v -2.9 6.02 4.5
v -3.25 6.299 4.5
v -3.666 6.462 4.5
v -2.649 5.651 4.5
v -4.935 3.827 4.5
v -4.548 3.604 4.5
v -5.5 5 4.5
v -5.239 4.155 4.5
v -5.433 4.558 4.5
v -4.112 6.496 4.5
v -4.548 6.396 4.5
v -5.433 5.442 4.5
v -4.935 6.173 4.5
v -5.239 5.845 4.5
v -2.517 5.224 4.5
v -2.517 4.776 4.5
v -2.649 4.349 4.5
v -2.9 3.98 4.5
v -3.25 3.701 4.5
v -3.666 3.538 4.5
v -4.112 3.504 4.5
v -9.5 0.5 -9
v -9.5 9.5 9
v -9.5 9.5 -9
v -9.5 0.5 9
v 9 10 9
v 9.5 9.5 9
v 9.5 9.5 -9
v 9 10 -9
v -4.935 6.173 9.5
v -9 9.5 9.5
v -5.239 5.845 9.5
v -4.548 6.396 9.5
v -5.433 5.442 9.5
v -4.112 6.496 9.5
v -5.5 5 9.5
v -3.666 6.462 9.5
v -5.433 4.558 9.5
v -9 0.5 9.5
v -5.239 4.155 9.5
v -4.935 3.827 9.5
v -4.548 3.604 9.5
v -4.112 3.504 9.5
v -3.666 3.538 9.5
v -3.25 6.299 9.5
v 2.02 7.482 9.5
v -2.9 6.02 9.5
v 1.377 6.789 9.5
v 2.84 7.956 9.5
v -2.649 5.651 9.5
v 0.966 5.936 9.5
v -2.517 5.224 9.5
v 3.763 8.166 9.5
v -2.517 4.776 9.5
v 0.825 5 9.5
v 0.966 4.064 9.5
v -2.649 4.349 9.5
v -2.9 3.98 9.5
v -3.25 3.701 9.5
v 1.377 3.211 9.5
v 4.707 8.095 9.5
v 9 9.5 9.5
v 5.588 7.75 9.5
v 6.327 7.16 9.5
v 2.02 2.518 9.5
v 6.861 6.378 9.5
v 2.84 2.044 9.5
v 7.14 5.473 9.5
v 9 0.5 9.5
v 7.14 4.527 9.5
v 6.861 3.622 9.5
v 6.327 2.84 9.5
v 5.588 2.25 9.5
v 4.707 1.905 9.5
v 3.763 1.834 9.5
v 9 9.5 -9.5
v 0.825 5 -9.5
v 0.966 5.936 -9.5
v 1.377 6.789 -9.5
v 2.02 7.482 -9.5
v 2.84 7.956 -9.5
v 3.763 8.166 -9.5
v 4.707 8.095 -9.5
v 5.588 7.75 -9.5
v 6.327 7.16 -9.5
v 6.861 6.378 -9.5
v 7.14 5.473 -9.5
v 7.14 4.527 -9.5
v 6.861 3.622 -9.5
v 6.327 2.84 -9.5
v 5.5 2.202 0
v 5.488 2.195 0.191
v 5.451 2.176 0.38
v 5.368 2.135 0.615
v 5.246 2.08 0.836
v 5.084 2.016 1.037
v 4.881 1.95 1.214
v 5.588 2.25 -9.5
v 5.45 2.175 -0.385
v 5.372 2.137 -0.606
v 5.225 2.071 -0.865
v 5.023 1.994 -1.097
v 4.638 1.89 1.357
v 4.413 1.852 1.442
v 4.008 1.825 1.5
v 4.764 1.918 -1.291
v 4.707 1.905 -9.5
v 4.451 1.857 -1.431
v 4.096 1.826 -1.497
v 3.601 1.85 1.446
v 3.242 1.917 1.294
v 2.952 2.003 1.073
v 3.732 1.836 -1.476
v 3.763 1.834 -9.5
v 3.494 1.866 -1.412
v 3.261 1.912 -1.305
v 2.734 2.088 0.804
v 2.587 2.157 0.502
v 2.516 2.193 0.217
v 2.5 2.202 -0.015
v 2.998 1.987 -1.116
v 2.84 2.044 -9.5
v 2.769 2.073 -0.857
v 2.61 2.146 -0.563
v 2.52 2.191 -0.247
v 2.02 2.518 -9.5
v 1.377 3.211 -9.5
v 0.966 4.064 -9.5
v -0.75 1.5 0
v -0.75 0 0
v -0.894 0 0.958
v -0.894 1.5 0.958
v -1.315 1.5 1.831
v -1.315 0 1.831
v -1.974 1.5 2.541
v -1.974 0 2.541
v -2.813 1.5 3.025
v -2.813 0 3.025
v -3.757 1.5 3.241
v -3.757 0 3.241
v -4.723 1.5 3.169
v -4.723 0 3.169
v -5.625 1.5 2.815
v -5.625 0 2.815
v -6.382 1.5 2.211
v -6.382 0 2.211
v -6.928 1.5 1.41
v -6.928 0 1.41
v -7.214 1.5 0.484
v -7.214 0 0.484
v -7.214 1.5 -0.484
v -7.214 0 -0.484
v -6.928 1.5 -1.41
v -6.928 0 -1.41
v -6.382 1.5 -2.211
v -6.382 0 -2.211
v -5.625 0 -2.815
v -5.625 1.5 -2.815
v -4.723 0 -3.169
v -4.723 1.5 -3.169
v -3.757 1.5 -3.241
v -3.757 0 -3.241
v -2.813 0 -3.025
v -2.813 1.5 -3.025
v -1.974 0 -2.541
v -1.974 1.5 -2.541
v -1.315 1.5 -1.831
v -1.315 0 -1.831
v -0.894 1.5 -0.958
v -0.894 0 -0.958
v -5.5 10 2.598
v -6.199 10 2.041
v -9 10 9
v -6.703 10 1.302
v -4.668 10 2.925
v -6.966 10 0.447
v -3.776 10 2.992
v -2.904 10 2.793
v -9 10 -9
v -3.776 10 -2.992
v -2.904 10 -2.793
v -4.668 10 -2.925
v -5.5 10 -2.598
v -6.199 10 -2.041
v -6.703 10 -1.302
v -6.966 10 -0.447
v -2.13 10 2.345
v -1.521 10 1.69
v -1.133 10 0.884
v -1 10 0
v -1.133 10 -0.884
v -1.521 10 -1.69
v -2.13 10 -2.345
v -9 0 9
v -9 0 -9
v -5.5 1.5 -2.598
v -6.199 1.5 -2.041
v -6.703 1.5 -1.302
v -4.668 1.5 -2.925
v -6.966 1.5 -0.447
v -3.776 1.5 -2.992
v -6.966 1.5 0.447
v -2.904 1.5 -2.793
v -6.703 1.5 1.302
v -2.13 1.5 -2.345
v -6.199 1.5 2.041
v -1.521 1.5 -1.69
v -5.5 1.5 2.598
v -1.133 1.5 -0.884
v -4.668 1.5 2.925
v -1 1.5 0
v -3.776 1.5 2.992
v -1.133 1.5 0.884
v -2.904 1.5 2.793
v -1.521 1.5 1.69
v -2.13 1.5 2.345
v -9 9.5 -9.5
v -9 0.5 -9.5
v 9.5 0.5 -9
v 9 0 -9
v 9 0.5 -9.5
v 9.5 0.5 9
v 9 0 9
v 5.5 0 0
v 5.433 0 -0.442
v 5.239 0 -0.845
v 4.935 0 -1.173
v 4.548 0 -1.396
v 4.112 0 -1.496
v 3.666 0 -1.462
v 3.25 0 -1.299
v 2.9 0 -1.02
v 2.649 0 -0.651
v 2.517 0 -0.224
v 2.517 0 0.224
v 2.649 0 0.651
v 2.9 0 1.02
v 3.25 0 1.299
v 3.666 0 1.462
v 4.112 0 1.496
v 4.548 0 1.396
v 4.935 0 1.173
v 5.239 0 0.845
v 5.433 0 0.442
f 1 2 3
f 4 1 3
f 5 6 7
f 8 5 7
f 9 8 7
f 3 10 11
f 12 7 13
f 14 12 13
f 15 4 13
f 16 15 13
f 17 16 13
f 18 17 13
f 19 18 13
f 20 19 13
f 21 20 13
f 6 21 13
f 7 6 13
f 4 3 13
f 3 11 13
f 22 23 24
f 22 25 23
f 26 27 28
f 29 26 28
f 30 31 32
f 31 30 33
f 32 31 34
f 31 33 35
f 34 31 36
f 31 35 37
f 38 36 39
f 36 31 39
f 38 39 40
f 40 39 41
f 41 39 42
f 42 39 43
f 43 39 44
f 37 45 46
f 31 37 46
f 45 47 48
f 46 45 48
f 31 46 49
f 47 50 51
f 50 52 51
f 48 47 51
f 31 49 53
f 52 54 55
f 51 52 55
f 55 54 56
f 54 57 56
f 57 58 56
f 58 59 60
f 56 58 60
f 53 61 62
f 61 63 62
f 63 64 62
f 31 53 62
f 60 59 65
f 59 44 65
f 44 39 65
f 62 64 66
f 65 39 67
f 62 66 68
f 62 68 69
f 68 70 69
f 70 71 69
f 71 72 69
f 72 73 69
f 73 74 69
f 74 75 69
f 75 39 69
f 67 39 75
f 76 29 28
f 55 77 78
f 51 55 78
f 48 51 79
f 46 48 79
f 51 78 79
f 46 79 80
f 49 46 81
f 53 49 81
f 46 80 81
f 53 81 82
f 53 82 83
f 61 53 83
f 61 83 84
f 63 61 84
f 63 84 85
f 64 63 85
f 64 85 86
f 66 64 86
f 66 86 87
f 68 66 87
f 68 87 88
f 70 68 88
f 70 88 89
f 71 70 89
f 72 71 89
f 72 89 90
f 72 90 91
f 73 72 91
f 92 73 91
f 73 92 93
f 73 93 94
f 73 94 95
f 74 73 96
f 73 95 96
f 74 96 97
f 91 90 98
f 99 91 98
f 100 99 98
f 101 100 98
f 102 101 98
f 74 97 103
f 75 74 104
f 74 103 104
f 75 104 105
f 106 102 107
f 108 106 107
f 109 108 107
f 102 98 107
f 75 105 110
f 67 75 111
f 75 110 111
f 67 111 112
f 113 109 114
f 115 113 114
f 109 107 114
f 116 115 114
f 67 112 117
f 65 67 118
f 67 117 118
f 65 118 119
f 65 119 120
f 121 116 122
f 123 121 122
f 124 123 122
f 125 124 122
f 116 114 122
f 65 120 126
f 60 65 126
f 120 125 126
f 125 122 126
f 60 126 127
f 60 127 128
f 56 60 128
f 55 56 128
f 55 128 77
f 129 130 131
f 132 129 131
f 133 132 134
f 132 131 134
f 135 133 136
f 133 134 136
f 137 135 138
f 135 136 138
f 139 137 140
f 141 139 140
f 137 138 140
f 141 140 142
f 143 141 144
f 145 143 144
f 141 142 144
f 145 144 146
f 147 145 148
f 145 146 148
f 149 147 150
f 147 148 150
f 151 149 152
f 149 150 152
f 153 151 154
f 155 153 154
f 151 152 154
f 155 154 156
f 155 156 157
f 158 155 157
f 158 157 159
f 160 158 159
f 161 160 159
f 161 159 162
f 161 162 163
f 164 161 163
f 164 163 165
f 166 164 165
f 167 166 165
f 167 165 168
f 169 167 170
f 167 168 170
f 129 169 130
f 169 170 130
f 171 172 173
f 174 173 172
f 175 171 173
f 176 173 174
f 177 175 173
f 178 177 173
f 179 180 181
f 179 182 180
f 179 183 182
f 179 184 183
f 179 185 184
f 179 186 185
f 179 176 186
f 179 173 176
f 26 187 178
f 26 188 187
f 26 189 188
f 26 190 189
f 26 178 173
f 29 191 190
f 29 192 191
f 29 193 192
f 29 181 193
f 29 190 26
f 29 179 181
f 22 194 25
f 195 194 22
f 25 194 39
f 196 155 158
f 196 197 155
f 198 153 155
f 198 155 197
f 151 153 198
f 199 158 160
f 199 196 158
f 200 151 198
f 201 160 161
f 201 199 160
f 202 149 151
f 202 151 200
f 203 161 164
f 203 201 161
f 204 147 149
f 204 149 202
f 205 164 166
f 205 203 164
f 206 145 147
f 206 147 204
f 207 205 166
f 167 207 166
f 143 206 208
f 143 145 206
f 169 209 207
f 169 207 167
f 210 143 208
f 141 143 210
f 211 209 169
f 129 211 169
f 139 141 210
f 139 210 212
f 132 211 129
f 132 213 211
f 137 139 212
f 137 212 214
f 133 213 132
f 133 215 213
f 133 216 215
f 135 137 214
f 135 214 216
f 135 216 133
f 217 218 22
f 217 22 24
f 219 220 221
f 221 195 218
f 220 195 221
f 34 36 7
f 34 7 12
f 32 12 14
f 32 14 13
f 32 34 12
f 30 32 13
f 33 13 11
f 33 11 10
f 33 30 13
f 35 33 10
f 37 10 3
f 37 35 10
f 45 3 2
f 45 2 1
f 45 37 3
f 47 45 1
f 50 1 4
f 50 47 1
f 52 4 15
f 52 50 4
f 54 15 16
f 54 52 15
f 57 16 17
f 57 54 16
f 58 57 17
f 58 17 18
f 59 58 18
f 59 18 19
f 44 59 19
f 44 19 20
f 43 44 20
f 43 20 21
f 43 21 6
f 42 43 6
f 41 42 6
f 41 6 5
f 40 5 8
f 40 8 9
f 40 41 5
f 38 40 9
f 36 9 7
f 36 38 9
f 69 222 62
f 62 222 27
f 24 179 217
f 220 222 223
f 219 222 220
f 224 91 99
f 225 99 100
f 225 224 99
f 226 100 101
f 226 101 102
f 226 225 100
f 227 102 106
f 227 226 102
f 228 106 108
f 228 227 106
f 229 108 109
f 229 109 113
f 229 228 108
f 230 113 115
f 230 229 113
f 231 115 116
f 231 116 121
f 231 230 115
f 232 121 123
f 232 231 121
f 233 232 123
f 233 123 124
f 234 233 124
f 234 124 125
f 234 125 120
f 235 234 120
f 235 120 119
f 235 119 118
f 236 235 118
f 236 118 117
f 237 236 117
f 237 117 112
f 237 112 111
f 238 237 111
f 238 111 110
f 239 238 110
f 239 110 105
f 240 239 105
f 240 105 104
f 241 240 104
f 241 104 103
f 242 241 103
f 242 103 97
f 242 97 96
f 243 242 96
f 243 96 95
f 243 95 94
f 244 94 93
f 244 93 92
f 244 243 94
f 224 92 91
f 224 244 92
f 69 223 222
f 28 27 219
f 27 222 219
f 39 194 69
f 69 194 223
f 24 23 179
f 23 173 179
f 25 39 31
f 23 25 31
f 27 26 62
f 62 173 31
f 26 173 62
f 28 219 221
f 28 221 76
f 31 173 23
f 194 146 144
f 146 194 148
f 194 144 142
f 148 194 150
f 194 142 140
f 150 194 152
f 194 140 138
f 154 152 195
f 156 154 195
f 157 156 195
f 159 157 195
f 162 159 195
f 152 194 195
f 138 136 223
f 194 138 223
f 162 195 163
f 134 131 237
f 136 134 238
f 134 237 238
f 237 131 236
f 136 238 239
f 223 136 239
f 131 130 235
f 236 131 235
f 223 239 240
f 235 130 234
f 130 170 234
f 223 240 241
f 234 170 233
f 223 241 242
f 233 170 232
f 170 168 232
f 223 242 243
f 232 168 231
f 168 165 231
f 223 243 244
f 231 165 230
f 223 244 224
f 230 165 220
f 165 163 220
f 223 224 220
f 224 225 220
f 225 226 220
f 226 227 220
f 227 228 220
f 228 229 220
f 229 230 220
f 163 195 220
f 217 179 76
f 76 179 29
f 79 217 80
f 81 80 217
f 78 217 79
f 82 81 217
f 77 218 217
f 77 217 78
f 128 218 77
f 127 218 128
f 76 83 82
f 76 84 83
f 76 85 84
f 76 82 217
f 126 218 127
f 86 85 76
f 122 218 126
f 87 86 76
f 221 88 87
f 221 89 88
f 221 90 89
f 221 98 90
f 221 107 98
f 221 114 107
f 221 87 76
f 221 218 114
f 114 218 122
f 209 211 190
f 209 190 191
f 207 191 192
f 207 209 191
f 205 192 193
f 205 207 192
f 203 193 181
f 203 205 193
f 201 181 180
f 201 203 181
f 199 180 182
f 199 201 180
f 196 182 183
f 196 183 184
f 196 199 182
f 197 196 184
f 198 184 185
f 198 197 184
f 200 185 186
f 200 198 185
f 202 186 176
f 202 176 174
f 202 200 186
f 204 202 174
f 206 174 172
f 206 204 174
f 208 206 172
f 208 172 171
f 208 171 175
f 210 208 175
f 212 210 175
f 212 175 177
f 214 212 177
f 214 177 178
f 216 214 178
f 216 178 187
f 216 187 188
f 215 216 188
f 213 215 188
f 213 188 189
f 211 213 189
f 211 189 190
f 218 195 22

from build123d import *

# Parameters (mm, degrees)
SKETCH2_W           = 19
SKETCH2_H           = 19
SKETCH2_R           = 3
BOSS_EXTRUDE1_DEPTH = 10
SKETCH3_R           = 3.25
CUT_EXTRUDE1_DEPTH  = 1.5
SKETCH7_R           = 3.175
CUT_EXTRUDE5_DEPTH  = 20
CUT_EXTRUDE9_REACH  = 12
SKETCH12_R          = 1.5
SKETCH14_R          = 1.5
CUT_EXTRUDE11_DEPTH = 5
CHAMFER1_SIZE       = 0.5


with BuildPart() as part:
    # Sketch2 → Boss-Extrude1 (new body)
    with BuildSketch(Plane(origin=(0, 0, 0), x_dir=(1, 0, 0), z_dir=(0, 1, 0))):
        Rectangle(SKETCH2_W, SKETCH2_H)
        with Locations((-4, 0)):
            Circle(SKETCH2_R, mode=Mode.SUBTRACT)
    extrude(amount=BOSS_EXTRUDE1_DEPTH)

    # Sketch3 → Cut-Extrude1 (cut)
    with BuildSketch(Plane.XZ):
        with Locations((-4, 0)):
            Circle(SKETCH3_R)
    extrude(amount=-CUT_EXTRUDE1_DEPTH, mode=Mode.SUBTRACT)

    # Sketch7 → Cut-Extrude5 (cut, through all)
    with BuildSketch(Plane(origin=(0, 0, -9.5), x_dir=(-1, 0, 0), z_dir=(0, 0, -1))):
        with Locations((-4, 5)):
            Circle(SKETCH7_R)
    extrude(amount=-CUT_EXTRUDE5_DEPTH, mode=Mode.SUBTRACT)

    # Sketch12 → Cut-Extrude9 (cut, up to next)
    with BuildSketch(Plane(origin=(0, 0, 0), x_dir=(1, 0, 0), z_dir=(0, 1, 0)), mode=Mode.PRIVATE) as cut_extrude9_sk1:
        with Locations((4, 0)):
            Circle(SKETCH12_R)
    cut_extrude9_tool1 = extrude(cut_extrude9_sk1.sketch, amount=CUT_EXTRUDE9_REACH, mode=Mode.PRIVATE) & part.part
    add(cut_extrude9_tool1.solids().sort_by_distance((4, 0, 0))[0], mode=Mode.SUBTRACT)

    # Sketch14 → Cut-Extrude11 (cut)
    with BuildSketch(Plane(origin=(0, 0, 9.5), x_dir=(-1, 0, 0), z_dir=(0, 0, -1))):
        with Locations((4, 5)):
            Circle(SKETCH14_R)
    extrude(amount=CUT_EXTRUDE11_DEPTH, mode=Mode.SUBTRACT)

    # Chamfer1
    chamfer1_edges = [part.edges().sort_by_distance(p)[0] for p in [
        (-9.5, 10, 0),
        (0, 10, 9.5),
        (9.5, 10, 0),
        (0, 0, 9.5),
        (-9.5, 0, 0),
        (0, 0, -9.5),
        (9.5, 0, 0),
        (0, 10, -9.5),
        (9.5, 5, 9.5),
        (-9.5, 5, 9.5),
        (-9.5, 5, -9.5),
        (9.5, 5, -9.5),
    ]]
    chamfer(chamfer1_edges, length=CHAMFER1_SIZE)


solid = part.part
